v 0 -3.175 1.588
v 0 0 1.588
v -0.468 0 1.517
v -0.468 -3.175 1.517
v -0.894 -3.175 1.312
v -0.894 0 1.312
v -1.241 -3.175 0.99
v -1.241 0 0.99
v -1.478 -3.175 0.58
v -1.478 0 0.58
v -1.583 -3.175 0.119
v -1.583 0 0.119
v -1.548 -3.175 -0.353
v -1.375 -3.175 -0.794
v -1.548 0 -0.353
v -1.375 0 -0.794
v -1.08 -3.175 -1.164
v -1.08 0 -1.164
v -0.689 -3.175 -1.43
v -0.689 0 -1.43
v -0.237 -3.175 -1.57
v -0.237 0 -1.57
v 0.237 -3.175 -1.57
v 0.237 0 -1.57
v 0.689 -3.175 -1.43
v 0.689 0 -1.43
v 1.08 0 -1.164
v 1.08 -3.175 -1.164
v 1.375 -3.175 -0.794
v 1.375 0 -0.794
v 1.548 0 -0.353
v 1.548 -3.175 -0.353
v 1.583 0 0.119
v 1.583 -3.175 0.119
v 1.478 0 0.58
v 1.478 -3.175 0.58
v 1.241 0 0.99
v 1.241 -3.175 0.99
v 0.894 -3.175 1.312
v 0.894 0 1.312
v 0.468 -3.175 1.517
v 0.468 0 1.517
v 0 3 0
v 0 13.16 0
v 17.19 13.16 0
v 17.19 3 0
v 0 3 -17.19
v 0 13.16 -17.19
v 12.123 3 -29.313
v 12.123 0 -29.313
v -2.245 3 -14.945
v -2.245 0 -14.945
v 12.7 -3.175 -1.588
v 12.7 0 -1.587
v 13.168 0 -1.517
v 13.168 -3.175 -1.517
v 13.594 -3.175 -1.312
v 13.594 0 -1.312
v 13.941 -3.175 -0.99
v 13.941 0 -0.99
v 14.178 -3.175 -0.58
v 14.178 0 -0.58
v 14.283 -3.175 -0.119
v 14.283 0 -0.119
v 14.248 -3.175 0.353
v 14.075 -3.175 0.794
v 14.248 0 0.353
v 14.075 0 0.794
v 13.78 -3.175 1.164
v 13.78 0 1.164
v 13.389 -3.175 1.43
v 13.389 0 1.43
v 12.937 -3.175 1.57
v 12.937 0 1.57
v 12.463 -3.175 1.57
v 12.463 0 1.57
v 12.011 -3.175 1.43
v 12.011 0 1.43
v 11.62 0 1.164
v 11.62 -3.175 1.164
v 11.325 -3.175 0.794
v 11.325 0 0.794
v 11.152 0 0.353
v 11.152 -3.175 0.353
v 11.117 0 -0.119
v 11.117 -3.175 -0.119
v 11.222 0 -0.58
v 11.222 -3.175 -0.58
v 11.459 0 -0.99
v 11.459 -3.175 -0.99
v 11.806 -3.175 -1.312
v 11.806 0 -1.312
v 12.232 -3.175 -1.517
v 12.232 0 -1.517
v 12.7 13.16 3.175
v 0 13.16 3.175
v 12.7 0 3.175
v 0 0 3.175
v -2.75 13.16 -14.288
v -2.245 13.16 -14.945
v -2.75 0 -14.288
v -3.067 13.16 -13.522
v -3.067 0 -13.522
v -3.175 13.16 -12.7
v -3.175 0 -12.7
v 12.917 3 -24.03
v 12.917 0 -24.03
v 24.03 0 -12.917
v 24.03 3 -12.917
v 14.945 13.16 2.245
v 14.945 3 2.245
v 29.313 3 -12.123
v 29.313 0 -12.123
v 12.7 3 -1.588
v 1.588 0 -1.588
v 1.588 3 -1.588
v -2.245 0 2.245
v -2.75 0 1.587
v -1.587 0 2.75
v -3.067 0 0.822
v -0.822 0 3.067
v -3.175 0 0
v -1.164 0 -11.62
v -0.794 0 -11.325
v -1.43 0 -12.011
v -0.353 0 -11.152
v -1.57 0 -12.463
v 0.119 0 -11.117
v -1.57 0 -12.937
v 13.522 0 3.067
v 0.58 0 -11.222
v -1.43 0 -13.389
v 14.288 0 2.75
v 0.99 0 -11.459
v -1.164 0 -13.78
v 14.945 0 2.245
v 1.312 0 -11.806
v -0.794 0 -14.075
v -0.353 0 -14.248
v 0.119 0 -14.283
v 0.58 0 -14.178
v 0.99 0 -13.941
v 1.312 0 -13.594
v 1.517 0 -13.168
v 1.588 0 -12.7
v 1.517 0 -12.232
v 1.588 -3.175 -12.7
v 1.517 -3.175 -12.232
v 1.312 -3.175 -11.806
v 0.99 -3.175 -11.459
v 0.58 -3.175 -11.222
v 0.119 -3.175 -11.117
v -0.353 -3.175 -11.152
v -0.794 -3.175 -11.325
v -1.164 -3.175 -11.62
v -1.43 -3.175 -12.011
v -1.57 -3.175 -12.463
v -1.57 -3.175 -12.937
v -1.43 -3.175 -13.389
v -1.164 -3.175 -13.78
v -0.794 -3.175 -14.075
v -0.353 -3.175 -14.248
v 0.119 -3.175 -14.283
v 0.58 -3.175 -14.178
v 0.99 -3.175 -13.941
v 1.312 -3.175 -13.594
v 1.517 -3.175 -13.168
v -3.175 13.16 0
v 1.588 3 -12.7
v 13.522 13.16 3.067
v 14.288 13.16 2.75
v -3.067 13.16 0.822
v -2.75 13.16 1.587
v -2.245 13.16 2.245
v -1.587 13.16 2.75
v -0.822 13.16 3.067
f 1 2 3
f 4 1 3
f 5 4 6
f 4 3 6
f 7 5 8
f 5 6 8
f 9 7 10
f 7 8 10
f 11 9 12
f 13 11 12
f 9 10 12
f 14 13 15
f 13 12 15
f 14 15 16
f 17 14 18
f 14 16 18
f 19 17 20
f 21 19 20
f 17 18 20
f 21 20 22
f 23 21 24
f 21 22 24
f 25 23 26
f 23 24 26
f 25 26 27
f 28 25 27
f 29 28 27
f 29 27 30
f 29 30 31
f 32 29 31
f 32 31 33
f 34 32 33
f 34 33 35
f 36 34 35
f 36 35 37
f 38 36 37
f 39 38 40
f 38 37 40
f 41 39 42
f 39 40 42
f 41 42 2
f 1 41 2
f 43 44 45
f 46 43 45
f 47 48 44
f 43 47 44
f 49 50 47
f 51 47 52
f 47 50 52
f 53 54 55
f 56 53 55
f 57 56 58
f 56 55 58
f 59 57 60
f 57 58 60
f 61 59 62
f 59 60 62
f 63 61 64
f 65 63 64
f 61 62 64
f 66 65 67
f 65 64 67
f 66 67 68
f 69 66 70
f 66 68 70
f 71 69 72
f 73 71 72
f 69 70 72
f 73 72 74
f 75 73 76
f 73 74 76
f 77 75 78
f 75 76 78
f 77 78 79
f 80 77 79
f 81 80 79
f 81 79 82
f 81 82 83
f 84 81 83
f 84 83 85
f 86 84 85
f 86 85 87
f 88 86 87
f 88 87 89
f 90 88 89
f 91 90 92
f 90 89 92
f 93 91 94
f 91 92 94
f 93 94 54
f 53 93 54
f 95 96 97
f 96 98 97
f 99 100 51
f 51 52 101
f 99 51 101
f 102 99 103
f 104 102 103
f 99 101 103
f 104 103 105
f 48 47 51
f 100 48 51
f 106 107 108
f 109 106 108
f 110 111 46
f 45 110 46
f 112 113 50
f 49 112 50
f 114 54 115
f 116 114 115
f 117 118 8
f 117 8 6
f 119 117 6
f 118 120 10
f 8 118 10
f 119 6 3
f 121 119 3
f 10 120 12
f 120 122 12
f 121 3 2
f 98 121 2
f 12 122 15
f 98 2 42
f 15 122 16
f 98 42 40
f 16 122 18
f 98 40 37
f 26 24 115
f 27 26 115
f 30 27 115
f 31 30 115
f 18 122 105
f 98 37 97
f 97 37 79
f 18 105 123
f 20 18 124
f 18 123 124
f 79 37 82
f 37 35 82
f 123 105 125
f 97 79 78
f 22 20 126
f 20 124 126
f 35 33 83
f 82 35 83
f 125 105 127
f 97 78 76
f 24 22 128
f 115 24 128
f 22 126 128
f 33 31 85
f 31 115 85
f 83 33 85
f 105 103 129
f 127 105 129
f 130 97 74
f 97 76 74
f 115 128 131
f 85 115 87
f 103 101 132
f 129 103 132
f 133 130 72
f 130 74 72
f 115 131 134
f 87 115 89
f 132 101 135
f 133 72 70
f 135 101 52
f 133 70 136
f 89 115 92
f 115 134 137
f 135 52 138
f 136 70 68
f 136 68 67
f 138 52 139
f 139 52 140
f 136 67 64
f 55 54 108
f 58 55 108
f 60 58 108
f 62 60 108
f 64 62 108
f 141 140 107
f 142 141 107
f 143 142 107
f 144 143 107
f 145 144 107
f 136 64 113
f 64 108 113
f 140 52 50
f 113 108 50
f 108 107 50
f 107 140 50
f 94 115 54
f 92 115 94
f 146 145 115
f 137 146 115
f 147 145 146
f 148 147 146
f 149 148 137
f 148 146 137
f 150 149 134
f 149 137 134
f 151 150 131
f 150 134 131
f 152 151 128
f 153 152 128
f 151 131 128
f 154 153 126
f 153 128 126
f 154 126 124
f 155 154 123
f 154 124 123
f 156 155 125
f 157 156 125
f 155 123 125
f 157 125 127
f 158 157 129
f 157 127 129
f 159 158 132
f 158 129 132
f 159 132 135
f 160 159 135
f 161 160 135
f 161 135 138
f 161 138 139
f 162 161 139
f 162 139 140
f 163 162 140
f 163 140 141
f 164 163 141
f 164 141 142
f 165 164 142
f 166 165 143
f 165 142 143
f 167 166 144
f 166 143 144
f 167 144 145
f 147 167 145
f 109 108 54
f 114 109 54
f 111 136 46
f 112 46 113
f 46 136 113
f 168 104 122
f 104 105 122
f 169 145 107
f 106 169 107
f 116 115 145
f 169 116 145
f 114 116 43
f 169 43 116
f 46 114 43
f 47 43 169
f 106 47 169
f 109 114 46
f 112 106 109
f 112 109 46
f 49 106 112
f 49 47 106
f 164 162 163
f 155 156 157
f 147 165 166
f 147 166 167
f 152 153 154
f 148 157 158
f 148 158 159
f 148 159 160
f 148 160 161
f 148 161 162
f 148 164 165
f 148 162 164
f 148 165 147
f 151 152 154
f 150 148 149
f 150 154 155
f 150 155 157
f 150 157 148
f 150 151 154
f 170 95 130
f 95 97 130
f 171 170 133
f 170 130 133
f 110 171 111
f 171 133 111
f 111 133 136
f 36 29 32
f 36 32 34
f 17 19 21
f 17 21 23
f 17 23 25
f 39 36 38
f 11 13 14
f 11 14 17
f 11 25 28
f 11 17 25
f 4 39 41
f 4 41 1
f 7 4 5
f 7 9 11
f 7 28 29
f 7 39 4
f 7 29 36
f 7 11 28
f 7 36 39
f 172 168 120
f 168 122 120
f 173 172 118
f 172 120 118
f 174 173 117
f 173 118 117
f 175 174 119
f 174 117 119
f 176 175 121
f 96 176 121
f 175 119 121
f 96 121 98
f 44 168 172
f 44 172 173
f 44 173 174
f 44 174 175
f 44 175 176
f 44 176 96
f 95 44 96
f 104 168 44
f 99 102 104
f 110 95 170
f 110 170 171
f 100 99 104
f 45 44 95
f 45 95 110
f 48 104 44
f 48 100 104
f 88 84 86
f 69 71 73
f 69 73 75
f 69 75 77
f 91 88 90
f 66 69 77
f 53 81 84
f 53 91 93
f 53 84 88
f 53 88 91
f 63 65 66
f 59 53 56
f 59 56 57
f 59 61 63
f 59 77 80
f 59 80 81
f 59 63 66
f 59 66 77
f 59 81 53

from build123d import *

# Parameters (mm, degrees)
BOSS_EXTRUDE1_DEPTH = 3
SKETCH5_R           = 1.5875
BOSS_EXTRUDE4_DEPTH = 3.175
BOSS_EXTRUDE5_DEPTH = 10.16
CUT_EXTRUDE1_DEPTH  = 10.16


with BuildPart() as part:
    # Sketch2 → Boss-Extrude1 (new body)
    with BuildSketch(Plane(origin=(0, 0, 0), x_dir=(1, 0, 0), z_dir=(0, 1, 0))):
        with BuildLine():
            Line((0, -3.175), (12.7, -3.175))
            ThreePointArc((12.7, -3.175), (13.915019898, -2.933317516), (14.94506403, -2.24506403))
            Line((14.94506403, -2.24506403), (29.313473824, 12.123345763))
            Line((29.313473824, 12.123345763), (12.123345763, 29.313473824))
            Line((12.123345763, 29.313473824), (-2.24506403, 14.94506403))
            ThreePointArc((-2.24506403, 14.94506403), (-2.933317516, 13.915019898), (-3.175, 12.7))
            Line((-3.175, 12.7), (-3.175, 0))
            ThreePointArc((-3.175, 0), (-2.24506403, -2.24506403), (0, -3.175))
        make_face()
        Polygon((24.029595763, 12.917095763), (12.7, 1.5875), (1.5875, 1.5875), (1.5875, 12.7), (12.917095763, 24.029595763), align=None, mode=Mode.SUBTRACT)
    extrude(amount=BOSS_EXTRUDE1_DEPTH)

    # Sketch5 → Boss-Extrude4 (add)
    with BuildSketch(Plane.XZ):
        with Locations(Location((0, 0, 0), (0, 0, 90))):
            Circle(SKETCH5_R)
        with Locations(Location((12.7, 0, 0), (0, 0, 270))):
            Circle(SKETCH5_R)
        with Locations((0, -12.7)):
            Circle(SKETCH5_R)
    extrude(amount=BOSS_EXTRUDE4_DEPTH)

    # Sketch6 → Boss-Extrude5 (add)
    with BuildSketch(Plane(origin=(0, 3, 0), x_dir=(1, 0, 0), z_dir=(0, 1, 0))):
        with BuildLine():
            Line((12.7, 1.5875), (1.5875, 1.5875))
            Line((1.5875, 1.5875), (1.5875, 12.7))
            Line((1.5875, 12.7), (1.5875, 18.777628061))
            Line((1.5875, 18.777628061), (-2.24506403, 14.94506403))
            ThreePointArc((-2.24506403, 14.94506403), (-2.933317516, 13.915019898), (-3.175, 12.7))
            Line((-3.175, 12.7), (-3.175, 0))
            ThreePointArc((-3.175, 0), (-2.24506403, -2.24506403), (0, -3.175))
            Line((0, -3.175), (12.7, -3.175))
            ThreePointArc((12.7, -3.175), (13.915019898, -2.933317516), (14.94506403, -2.24506403))
            Line((14.94506403, -2.24506403), (18.777628061, 1.5875))
            Line((18.777628061, 1.5875), (12.7, 1.5875))
        make_face()
    extrude(amount=BOSS_EXTRUDE5_DEPTH)

    # Sketch7 → Cut-Extrude1 (cut)
    with BuildSketch(Plane(origin=(0, 13.16, 0), x_dir=(1, 0, 0), z_dir=(0, 1, 0))):
        Polygon((1.5875, 1.5875), (1.5875, 18.777628061), (0, 17.190128061), (0, 0), (17.190128061, 0), (18.777628061, 1.5875), align=None)
    extrude(amount=-CUT_EXTRUDE1_DEPTH, mode=Mode.SUBTRACT)


solid = part.part
